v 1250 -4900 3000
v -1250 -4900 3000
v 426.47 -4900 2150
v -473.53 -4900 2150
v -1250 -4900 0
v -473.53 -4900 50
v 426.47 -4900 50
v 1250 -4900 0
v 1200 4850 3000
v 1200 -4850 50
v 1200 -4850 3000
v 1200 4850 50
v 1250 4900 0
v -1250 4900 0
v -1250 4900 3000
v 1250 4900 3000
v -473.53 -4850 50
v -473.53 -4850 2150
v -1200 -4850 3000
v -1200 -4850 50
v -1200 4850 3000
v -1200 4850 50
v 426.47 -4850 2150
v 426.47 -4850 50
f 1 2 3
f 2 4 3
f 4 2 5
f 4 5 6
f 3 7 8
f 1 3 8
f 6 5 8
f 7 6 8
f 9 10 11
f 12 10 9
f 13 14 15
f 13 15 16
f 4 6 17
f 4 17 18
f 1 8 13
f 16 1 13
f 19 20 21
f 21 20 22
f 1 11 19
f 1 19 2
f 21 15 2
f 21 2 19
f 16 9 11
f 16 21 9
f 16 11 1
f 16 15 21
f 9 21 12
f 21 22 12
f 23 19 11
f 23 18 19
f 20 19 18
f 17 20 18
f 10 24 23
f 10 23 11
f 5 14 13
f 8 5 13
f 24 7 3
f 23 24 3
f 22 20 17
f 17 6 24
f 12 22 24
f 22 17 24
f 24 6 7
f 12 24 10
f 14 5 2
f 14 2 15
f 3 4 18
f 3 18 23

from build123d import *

# Parameters (mm, degrees)
F0_W     = 2500
F0_H     = 9800
F1_DEPTH = 3000
F2_T     = -50
F3_W     = 900
F3_H     = 2100
F4_DEPTH = 50


with BuildPart() as f1:
    # F0 (on Top) → F1 (new body)
    with BuildSketch(Plane.XY):
        Rectangle(F0_W, F0_H)
    extrude(amount=F1_DEPTH)

    # F2
    f2_openings = [f1.faces().sort_by_distance(p)[0] for p in [
        (0, 0, 3000),
    ]]
    offset(amount=F2_T, openings=f2_openings)

    # F3 (on face) → F4 (cut)
    with BuildSketch(Plane.XZ.offset(4900)):
        with Locations((-23.530175, 1100)):
            Rectangle(F3_W, F3_H)
    extrude(amount=-F4_DEPTH, mode=Mode.SUBTRACT)


solid = f1.part
